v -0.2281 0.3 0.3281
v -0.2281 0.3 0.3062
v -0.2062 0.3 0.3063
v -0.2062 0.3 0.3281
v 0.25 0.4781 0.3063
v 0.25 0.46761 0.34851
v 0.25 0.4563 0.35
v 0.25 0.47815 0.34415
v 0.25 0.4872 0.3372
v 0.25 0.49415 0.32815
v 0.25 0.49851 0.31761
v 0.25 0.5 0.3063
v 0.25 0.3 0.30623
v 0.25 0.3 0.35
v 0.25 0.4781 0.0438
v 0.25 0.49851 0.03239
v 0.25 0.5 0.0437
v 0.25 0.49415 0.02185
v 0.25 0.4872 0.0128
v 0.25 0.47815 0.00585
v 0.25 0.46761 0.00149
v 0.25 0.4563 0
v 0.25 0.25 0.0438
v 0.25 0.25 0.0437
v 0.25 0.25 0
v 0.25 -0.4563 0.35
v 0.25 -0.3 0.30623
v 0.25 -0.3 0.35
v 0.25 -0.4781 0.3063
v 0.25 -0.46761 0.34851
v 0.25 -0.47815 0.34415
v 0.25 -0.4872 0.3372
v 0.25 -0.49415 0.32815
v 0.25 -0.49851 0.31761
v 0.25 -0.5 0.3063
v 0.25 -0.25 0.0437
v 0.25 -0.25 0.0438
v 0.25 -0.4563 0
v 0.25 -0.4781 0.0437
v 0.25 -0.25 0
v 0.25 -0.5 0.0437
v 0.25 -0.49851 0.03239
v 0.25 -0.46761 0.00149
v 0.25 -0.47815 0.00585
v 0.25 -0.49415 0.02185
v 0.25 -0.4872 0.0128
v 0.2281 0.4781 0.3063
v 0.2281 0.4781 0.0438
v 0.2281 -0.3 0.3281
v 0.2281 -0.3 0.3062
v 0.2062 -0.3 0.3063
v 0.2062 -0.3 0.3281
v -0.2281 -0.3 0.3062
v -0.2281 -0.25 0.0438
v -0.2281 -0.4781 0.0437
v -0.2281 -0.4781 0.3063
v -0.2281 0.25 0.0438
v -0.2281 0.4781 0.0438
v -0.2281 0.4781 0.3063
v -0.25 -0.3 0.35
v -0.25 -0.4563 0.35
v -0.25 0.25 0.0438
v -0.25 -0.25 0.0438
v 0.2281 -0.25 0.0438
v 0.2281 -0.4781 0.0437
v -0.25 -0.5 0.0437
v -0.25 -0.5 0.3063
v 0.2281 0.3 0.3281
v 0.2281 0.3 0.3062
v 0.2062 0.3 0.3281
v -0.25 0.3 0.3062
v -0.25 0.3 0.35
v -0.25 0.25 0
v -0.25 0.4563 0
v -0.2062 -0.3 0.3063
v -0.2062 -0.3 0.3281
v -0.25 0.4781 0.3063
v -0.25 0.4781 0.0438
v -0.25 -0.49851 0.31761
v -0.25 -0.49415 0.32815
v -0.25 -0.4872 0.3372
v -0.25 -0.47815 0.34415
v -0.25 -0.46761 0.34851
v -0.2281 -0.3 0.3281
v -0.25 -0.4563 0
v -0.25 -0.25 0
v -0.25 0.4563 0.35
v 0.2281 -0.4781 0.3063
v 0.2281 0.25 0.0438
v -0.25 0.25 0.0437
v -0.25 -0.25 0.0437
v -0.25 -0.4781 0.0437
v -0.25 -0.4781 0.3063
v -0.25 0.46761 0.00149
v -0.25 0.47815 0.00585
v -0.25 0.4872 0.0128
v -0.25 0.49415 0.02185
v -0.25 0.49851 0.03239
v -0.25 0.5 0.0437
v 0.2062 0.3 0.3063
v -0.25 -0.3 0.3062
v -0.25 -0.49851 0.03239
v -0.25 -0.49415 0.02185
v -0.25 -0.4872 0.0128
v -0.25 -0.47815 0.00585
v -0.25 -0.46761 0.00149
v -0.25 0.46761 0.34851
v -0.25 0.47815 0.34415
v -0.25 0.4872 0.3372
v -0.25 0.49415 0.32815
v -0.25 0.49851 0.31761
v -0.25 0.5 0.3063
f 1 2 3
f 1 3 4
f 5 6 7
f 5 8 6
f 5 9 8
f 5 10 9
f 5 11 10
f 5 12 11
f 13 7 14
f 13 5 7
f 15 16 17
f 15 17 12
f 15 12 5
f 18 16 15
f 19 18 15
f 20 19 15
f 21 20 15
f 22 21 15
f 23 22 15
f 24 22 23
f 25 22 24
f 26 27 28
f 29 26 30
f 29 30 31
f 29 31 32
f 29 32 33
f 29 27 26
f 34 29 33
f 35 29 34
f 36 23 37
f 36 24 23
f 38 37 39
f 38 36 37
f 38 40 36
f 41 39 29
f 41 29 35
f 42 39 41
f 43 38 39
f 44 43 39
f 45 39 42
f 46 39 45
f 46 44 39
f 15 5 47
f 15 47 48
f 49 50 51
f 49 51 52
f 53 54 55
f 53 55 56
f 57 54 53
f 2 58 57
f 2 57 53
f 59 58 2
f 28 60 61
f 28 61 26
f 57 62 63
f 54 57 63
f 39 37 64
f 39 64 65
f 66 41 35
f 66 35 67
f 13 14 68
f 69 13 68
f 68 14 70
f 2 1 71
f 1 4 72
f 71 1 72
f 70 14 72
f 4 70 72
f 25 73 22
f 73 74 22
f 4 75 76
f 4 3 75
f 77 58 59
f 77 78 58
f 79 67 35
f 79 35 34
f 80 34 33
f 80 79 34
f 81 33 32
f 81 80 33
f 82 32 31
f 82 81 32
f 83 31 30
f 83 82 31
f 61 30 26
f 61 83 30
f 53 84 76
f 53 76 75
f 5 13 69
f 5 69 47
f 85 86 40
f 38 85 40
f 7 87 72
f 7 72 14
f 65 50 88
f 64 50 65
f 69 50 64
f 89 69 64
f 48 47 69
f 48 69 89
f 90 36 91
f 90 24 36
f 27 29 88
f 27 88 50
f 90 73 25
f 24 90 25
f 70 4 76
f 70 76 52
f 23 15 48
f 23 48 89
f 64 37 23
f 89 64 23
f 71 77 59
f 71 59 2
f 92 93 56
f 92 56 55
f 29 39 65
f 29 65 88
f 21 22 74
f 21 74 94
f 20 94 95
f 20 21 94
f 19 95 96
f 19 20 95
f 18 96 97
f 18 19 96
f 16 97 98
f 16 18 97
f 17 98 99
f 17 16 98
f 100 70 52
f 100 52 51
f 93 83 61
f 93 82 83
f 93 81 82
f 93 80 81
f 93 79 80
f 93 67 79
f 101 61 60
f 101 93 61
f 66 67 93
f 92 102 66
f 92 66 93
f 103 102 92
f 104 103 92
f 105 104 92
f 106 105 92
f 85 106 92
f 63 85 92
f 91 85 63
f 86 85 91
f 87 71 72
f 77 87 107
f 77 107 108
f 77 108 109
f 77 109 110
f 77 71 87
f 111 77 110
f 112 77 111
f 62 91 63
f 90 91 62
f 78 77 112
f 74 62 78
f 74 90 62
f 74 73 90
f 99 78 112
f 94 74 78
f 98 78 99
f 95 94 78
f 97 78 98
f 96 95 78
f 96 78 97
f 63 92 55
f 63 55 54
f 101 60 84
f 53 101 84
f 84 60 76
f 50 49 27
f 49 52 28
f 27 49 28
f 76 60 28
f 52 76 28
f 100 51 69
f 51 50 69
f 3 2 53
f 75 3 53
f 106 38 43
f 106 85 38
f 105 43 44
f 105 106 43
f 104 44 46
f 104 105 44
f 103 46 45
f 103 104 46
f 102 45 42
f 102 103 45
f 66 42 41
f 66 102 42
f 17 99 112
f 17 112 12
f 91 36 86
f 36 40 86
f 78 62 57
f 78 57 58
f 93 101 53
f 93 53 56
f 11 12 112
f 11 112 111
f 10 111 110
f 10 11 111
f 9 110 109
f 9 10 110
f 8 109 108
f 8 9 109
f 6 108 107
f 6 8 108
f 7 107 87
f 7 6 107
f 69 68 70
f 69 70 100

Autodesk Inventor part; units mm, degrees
ref_plane "YZ Plane" through (0, 0, 0) normal (1, 0, 0) x (0, 1, 0)
ref_plane "XZ Plane" through (0, 0, 0) normal (0, 1, 0) x (-1, 0, 0)
ref_plane "XY Plane" through (0, 0, 0) normal (0, 0, 1) x (1, 0, 0)
sketch "Sketch1" plane through (0, 0, 0) normal (0, 0, 1) x (1, 0, 0)
  line L0 (0.25, -0.5) -> (-0.25, -0.5)
  line L1 (-0.25, -0.5) -> (-0.25, 0.5)
  line L2 (-0.25, 0.5) -> (0.25, 0.5)
  line L3 (0.25, 0.5) -> (0.25, -0.5)
  line L4 (0.25, -0.5) -> (-0.25, 0.5) construction
  line L5 (-0.25, -0.5) -> (0.25, 0.5) construction
  point P0 (0, 0)
  dimension "d0" = 0.5
  dimension "d1" = 1
extrude "Extrusion1" add sketch "Sketch1" along normal blind 0.35
sketch "Sketch2" plane through (0, 0, 0) normal (0, 0, -1) x (-1, 0, 0)
  line L0 (-0.25, -0.5) -> (0.25, -0.5) projected
  line L1 (0.25, -0.5) -> (0.25, 0.5) projected
  line L2 (0.25, 0.5) -> (-0.25, 0.5) projected
  line L3 (-0.25, 0.5) -> (-0.25, -0.5) projected
  line L4 (-0.25, -0.25) -> (0.25, -0.25)
  line L5 (0.25, 0.5) -> (0.25, -0.5) projected
  line L6 (0.25, 0.25) -> (-0.25, 0.25)
  point P0 (0, 0)
  dimension "d4" = 0.25
  dimension "d5" = 0.25
extrude "Extrusion2" cut sketch "Sketch2" against normal blind 0.0437 contours L3 L6 L1 L4
sketch "Sketch3" plane through (0, 0, 0.35) normal (0, 0, 1) x (1, 0, 0)
  line L0 (-0.25, -0.5) -> (0.25, -0.5) projected
  line L1 (0.25, -0.5) -> (0.25, 0.5) projected
  line L2 (0.25, 0.5) -> (-0.25, 0.5) projected
  line L3 (-0.25, 0.5) -> (-0.25, -0.5) projected
  line L4 (-0.25, 0.25) -> (-0.25, -0.25) projected
  line L5 (-0.25, -0.5) -> (-0.25, 0.5) projected
  line L6 (0.25, 0.5) -> (-0.25, 0.5) projected
  line L7 (0.25, 0.3) -> (-0.25, 0.3)
  line L8 (-0.25, 0.3) -> (-0.25, -0.3)
  line L9 (-0.25, -0.3) -> (0.25, -0.3)
  line L10 (0.25, -0.3) -> (0.25, 0.3)
  line L11 (0.25, 0.3) -> (-0.25, -0.3) construction
  line L12 (-0.25, 0.3) -> (0.25, -0.3) construction
  point P0 (0, 0)
  dimension "d22" = 0.2
extrude "Extrusion7" cut sketch "Sketch3" against normal blind 0.0437 contours L3 L7 L1 L9
sketch "Sketch4" plane through (0.25, -0.5, 0.35) normal (1, 0, 0) x (0, 0, -1)
  line L0 (0, 0) -> (0, 0.2) projected
  line L1 (0.35, 0) -> (0, 0) projected
  line L2 (0.35, 0.25) -> (0.35, 0) projected
  line L3 (0.35, 1) -> (0, 1) projected
  line L4 (0.35, 0.25) -> (0.3062, 0.25) projected
  line L5 (0.3062, 0.25) -> (0.3062, 0.75) projected
  line L6 (0.3062, 0.75) -> (0.35, 0.75) projected
  line L7 (0.35, 1) -> (0.35, 0.75) projected
  line L8 (0.0438, 0.2) -> (0, 0.2) projected
  line L9 (0, 0.8) -> (0.0438, 0.8) projected
  line L10 (0.0438, 0.8) -> (0.0438, 0.2) projected
  line L11 (0.3063, 0.0219) -> (0.0437, 0.0219)
  line L12 (0.0437, 0.0219) -> (0.0437, 0.9781)
  line L13 (0.0437, 0.9781) -> (0.3062, 0.9781)
  line L14 (0.3062, 0.9781) -> (0.3063, 0.0219)
  line L15 (0.3063, 0.0219) -> (0.0437, 0.9781) construction
  line L16 (0.0437, 0.0219) -> (0.3062, 0.9781) construction
  line L17 (0, 0.8) -> (0, 1) projected
  point P0 (0.175, 0.5)
  dimension "d25" = 0.0219
  dimension "d26" = 0.0219
extrude "Extrusion8" cut sketch "Sketch4" against normal blind 0.0219 contours L10 L12 L13 L14 L5 L11
mirror "Mirror1" about plane through (0, 0, 0) normal (1, 0, 0) of "Extrusion8"
sketch "Sketch7" plane through (0, 0, 0.3062) normal (0, 0, 1) x (1, 0, 0)
  line L0 (-0.2281, 0.3) -> (-0.2281, -0.3) projected
  line L1 (0.2281, -0.3) -> (-0.2281, -0.3) projected
  line L2 (0.2281, -0.3) -> (0.2281, 0.3) projected
  line L3 (-0.2281, 0.3) -> (0.2281, 0.3) projected
  point P0 (0, 0)
extrude "Extrusion9" add sketch "Sketch7" along normal blind 0.0219
sketch "Sketch8" plane through (0.2281, -0.5, 0.35) normal (1, 0, 0) x (0, 0, -1)
  line L0 (0.3063, 0.0219) -> (0.0437, 0.0219) projected
  line L1 (0.3063, 0.25) -> (0.3063, 0.0219) projected
  line L2 (0.3063, 0.75) -> (0.3063, 0.25) projected
  line L3 (0.3062, 0.9781) -> (0.3063, 0.75) projected
  line L4 (0.0437, 0.9781) -> (0.3062, 0.9781) projected
  line L5 (0.0437, 0.8) -> (0.0437, 0.9781) projected
  line L6 (0.0219, 0.8) -> (0.0437, 0.8) projected
  line L7 (0.0219, 0.2) -> (0.0219, 0.8) projected
  line L8 (0.0437, 0.2) -> (0.0219, 0.2) projected
  line L9 (0.0437, 0.0219) -> (0.0437, 0.2) projected
  line L10 (0.0437, 0.2) -> (0.0437, 0.8)
  point P0 (0.35, 0.5)
extrude "Extrusion10" cut sketch "Sketch8" against normal blind 0.0219 contours L8 L7 L6 L10
mirror "Mirror2" about plane through (0, 0, 0) normal (1, 0, 0) of "Extrusion10"
fillet "Fillet1" radius 0.0437 4 edges at (0, -0.5, 0.35) (0, 0.5, 0.35) (0, 0.5, 0) (0, -0.5, 0)
equation "\"d0\" = width"
equation "\"d1\" = length"
equation "\"d2\" = height"
equation "\"d4\" = i2"
equation "\"d5\" = i2"
equation "\"d6\" = 0.125 * height"
equation "\"d22\" = i1"
equation "\"d23\" = 0.125 * height"
equation "\"d25\" = 0.0625 * height"
equation "\"d26\" = 0.0625 * height"
equation "\"d27\" = 0.0625 * height"
equation "\"d29\" = 0.0625 * height"
equation "\"d31\" = 0.0625 * height"
equation "\"d21\" = 0.125 * height"
equation "\"length\" = 1"
equation "\"width\" = 0.5"
equation "\"height\" = 0.35"
equation "\"i1\" = 0.2"
equation "\"i2\" = 0.25"
properties part number "RC0402" material "ABS Plastic"
